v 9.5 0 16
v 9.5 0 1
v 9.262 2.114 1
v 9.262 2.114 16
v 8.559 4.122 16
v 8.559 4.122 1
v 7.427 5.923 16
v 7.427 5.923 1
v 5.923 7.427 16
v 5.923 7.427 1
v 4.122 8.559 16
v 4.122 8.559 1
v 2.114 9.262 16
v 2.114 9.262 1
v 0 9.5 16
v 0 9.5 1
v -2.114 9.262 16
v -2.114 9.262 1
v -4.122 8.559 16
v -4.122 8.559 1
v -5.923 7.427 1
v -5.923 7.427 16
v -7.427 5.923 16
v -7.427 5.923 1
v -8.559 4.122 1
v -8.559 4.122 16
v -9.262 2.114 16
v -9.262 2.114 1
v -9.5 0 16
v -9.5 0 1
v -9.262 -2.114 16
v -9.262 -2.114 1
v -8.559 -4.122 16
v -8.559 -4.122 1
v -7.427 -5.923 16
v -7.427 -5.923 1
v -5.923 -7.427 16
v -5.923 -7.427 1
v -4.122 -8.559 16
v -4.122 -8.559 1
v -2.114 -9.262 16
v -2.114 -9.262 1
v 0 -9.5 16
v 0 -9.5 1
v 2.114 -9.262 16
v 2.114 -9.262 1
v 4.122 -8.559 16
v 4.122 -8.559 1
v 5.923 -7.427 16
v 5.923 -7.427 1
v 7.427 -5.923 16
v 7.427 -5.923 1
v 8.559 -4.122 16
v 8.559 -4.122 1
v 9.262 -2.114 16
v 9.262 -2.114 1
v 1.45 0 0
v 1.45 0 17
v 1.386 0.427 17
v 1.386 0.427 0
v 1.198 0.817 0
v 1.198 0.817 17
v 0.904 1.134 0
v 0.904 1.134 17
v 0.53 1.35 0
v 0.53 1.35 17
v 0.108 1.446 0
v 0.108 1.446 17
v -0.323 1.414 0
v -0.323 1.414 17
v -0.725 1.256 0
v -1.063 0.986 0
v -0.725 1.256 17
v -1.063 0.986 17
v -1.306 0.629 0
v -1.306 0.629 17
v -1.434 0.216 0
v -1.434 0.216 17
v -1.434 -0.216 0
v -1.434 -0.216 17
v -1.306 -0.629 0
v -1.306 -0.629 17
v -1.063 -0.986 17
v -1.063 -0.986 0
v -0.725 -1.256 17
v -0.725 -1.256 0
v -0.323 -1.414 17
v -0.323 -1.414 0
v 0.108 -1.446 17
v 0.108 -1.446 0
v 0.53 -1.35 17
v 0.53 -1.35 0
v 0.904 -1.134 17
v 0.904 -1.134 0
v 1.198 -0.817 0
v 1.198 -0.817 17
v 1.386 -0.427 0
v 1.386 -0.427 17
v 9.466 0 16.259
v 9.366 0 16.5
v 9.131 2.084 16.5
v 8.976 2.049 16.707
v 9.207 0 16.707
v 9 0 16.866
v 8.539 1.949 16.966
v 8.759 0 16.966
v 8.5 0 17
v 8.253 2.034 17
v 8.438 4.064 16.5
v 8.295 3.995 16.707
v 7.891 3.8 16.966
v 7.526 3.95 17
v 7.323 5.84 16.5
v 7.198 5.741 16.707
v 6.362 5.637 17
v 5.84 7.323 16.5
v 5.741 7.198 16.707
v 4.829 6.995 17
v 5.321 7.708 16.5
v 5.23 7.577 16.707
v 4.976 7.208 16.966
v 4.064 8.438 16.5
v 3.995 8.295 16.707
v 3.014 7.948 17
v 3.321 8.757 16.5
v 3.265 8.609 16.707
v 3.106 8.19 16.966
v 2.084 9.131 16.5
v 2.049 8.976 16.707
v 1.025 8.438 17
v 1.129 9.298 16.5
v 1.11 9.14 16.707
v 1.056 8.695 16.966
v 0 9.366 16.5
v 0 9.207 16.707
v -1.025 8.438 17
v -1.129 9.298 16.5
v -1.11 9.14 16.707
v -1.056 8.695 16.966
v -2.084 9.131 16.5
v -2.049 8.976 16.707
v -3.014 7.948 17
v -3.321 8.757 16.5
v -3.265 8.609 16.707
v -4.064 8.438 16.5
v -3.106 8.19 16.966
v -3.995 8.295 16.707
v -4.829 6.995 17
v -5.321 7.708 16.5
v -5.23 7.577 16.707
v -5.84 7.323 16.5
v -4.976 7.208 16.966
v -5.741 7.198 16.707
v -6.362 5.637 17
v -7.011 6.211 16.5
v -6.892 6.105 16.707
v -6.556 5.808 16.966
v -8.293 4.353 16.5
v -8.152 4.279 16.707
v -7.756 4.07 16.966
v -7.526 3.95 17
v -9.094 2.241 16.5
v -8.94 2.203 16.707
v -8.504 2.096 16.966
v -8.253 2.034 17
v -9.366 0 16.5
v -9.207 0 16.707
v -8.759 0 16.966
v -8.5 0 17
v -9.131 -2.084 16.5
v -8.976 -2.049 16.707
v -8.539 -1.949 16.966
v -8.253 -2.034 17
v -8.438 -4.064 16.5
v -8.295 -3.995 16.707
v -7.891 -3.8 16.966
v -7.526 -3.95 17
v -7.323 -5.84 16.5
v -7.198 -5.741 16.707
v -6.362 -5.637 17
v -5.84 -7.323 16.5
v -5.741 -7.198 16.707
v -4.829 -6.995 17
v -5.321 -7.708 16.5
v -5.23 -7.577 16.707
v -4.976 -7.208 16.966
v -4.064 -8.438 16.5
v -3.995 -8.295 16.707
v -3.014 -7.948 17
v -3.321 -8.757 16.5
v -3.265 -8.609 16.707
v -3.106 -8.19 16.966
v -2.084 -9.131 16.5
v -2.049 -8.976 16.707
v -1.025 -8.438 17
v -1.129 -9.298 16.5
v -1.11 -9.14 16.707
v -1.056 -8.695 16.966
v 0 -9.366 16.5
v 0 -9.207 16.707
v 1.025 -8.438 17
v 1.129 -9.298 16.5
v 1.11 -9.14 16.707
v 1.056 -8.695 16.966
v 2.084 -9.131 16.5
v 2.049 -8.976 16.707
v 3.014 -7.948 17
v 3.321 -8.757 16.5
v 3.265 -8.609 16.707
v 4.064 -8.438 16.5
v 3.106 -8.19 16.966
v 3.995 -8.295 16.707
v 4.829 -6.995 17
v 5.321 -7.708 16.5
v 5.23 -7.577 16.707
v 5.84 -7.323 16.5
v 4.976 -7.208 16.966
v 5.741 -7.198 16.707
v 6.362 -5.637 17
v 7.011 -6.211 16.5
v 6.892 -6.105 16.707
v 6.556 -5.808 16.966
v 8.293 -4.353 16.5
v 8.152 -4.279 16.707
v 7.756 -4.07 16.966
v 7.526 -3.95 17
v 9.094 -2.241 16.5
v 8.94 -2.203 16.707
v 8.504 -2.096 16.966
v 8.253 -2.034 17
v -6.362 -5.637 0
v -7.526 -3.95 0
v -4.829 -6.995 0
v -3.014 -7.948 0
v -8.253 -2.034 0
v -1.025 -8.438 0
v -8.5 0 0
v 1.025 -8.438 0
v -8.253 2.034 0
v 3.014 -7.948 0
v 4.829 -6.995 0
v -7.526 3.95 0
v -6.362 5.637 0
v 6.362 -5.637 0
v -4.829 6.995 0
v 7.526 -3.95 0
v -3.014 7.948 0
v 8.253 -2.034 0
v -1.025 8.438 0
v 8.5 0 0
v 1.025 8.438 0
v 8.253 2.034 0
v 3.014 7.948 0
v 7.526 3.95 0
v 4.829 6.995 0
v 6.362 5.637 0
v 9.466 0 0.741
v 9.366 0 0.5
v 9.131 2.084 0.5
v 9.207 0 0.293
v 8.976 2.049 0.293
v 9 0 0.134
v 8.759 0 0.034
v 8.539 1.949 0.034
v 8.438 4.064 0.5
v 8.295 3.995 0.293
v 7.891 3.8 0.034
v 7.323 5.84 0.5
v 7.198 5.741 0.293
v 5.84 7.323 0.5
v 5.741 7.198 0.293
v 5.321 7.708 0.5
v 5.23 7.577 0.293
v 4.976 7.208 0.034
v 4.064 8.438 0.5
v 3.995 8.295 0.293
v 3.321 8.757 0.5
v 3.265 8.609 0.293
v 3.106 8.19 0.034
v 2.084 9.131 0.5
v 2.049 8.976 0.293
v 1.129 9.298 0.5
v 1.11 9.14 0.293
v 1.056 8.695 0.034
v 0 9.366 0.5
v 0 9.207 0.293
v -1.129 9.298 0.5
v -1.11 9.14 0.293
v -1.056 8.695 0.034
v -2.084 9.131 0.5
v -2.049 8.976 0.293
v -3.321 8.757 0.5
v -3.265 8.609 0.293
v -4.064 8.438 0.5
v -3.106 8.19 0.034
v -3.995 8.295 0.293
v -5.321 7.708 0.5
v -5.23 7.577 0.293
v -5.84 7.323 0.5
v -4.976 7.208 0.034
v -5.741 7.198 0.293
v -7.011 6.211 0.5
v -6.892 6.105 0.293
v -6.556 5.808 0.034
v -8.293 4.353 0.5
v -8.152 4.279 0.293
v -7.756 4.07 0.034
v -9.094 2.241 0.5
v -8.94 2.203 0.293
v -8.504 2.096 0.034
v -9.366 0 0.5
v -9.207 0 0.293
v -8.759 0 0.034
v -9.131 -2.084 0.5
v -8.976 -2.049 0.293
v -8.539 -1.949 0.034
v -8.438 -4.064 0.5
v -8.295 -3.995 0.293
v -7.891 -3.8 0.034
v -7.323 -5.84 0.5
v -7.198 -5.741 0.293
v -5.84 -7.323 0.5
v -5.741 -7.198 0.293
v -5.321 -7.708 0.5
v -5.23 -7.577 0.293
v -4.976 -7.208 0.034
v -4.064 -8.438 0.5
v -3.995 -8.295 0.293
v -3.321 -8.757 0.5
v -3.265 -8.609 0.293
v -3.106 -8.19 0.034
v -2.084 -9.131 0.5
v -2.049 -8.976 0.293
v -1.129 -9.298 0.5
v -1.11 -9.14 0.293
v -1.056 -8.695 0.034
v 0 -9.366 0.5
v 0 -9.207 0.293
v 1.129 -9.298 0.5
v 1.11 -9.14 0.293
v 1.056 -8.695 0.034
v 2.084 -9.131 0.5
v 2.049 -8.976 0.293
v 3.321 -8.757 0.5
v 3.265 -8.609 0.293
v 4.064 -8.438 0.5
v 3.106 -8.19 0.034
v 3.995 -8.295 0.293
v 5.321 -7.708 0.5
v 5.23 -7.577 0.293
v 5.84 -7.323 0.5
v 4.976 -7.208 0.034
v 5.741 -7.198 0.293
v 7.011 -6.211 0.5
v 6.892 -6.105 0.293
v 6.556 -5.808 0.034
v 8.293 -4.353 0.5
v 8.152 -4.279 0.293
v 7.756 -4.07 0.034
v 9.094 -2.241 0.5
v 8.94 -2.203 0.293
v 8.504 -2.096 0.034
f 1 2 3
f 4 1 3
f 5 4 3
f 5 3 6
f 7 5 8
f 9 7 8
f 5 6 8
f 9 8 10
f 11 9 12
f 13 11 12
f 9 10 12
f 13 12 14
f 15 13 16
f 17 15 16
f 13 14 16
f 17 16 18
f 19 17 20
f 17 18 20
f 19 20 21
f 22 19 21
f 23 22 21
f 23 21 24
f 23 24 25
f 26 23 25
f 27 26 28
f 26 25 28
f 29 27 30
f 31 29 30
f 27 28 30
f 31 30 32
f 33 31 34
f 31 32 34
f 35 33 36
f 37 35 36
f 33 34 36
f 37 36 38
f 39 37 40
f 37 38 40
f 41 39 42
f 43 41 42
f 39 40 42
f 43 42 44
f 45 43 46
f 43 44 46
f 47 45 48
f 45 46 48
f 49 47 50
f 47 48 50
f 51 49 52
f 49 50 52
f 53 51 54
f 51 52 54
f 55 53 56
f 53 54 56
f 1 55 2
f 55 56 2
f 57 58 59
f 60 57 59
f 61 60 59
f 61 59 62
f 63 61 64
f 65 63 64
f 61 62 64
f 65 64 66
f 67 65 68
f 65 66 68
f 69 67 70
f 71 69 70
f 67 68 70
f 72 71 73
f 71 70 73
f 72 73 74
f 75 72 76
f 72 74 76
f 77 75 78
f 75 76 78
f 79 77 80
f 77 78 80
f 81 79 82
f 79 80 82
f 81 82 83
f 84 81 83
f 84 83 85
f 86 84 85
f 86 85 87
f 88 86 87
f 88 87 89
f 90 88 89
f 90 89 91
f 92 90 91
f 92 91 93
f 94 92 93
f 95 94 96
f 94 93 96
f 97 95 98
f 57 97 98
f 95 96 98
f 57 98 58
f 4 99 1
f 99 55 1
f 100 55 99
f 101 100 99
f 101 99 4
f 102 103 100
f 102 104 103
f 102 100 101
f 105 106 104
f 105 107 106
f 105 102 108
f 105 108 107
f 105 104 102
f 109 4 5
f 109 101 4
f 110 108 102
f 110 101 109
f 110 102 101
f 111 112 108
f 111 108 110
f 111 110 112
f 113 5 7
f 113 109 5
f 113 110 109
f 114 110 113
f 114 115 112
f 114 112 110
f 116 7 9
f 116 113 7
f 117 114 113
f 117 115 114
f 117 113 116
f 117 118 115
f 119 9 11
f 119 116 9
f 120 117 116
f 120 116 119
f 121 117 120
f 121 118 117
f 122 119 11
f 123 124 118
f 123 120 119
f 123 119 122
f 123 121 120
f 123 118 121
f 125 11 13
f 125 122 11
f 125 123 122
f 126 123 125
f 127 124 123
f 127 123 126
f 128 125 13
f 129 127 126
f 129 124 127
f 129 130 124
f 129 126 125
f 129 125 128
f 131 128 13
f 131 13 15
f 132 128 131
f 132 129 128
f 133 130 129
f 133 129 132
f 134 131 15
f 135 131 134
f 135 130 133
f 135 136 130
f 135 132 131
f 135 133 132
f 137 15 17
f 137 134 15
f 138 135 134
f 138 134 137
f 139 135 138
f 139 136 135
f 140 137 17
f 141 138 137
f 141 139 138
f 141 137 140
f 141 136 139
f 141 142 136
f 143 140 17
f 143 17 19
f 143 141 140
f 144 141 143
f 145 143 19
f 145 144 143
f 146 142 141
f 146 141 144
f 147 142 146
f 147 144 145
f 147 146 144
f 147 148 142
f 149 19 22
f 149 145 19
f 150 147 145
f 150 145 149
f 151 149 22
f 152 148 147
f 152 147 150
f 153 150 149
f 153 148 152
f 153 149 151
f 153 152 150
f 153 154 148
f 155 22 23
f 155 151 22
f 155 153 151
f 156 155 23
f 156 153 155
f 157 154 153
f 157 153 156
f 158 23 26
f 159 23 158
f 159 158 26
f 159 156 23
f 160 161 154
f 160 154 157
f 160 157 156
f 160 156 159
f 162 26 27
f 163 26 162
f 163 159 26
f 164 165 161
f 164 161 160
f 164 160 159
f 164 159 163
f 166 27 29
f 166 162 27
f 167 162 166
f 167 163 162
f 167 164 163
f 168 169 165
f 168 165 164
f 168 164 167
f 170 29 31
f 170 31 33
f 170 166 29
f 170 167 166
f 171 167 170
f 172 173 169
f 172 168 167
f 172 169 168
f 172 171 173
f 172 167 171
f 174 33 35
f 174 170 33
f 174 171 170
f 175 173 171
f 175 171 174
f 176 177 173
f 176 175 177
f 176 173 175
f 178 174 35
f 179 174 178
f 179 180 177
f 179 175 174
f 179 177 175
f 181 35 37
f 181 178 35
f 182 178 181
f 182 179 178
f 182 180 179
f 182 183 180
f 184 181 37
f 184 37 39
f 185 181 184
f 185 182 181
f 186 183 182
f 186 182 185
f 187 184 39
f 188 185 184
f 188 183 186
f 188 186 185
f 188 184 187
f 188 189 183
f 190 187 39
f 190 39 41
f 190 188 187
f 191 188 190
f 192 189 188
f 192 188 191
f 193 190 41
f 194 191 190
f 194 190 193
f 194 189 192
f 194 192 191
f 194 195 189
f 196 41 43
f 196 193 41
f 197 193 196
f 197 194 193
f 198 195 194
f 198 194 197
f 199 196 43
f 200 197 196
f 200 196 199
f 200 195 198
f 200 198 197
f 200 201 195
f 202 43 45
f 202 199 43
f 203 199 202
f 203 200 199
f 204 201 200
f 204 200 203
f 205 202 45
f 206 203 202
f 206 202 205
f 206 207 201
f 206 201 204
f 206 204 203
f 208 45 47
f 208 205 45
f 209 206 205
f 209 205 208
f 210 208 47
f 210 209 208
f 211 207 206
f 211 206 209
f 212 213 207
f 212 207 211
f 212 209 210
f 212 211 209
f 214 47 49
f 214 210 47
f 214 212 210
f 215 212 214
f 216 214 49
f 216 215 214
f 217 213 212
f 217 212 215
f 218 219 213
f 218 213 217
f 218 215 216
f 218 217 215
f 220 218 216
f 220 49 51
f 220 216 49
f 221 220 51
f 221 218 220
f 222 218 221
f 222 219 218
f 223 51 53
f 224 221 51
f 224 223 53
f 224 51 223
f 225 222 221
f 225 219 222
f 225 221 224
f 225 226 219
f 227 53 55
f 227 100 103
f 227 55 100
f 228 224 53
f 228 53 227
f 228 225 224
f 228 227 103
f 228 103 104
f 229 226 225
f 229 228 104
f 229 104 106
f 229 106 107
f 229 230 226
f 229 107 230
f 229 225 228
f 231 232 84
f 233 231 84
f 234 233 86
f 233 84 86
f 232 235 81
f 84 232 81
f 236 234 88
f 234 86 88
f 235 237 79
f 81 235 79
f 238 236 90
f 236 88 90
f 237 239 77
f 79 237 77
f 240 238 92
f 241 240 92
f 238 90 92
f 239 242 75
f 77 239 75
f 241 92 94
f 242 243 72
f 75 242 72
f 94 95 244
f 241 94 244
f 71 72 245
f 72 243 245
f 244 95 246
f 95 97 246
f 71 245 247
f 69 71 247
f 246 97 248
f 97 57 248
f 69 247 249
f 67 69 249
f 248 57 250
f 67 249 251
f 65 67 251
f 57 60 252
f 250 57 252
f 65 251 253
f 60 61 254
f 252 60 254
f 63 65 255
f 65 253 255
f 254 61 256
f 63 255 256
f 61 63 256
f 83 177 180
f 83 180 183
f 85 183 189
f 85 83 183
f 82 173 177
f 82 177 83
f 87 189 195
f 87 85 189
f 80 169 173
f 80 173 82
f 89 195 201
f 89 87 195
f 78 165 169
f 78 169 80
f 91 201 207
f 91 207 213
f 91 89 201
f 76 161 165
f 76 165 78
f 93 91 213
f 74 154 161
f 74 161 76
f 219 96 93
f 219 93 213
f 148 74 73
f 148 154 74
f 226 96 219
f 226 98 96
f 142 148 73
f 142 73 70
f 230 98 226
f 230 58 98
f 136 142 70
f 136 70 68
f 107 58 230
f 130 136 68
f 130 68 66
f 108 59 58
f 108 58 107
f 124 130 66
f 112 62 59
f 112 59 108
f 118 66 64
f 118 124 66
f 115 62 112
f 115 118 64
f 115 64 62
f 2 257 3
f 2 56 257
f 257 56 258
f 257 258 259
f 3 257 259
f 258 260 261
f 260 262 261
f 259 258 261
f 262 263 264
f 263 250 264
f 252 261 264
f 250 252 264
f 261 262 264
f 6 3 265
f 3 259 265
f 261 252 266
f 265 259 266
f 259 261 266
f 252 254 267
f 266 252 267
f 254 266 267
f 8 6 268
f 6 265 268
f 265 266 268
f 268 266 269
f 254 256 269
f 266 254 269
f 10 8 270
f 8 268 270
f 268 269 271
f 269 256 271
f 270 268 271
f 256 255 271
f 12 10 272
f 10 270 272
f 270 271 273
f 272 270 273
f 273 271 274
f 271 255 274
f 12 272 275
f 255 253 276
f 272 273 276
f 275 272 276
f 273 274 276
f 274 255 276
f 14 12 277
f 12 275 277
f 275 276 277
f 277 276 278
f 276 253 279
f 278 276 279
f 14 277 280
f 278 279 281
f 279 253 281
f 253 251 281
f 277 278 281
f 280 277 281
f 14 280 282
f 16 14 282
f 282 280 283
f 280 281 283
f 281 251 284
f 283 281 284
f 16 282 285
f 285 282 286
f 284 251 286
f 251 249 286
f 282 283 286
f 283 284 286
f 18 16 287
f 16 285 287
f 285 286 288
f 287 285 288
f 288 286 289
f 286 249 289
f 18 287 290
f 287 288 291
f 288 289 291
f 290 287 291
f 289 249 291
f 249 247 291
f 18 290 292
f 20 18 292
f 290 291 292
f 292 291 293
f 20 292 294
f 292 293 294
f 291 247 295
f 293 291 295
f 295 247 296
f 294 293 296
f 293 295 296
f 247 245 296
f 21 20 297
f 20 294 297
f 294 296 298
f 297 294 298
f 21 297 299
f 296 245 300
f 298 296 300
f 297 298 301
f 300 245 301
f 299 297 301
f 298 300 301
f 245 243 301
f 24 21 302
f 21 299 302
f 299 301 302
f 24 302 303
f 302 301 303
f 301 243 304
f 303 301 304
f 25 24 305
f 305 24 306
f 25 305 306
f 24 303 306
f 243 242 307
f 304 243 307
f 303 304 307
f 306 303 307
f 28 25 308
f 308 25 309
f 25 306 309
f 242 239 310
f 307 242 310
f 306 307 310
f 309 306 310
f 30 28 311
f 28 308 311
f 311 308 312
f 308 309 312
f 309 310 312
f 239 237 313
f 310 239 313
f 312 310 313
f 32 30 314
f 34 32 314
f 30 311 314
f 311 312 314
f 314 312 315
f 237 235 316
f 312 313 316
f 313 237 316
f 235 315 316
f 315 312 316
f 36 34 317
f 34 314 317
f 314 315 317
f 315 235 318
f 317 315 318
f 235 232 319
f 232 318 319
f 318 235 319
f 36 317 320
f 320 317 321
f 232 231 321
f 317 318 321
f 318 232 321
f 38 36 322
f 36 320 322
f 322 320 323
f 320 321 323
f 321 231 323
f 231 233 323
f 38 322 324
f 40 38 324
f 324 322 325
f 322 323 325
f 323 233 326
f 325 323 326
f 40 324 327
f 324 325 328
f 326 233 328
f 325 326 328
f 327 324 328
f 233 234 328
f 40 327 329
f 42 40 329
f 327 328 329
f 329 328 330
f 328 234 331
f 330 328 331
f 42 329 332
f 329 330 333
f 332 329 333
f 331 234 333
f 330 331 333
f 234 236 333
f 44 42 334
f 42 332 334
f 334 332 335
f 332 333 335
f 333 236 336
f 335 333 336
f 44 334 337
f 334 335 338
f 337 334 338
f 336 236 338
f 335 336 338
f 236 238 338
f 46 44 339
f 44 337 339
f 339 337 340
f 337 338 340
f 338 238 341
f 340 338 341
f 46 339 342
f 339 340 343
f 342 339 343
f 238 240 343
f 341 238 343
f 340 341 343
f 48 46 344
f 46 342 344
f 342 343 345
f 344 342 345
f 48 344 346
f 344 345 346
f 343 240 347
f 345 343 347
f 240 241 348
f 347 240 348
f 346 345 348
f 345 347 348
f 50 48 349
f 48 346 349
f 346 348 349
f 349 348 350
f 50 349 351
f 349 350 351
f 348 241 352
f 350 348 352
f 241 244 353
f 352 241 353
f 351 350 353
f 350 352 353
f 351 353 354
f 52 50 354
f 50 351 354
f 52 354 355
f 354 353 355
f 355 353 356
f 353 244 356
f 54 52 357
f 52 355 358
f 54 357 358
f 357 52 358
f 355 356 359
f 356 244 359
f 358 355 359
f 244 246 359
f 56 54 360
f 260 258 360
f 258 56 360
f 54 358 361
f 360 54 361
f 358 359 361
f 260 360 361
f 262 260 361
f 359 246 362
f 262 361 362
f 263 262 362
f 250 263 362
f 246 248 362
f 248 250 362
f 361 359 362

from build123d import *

# Parameters (mm, degrees)
SKETCH1_R           = 9.5
BOSS_EXTRUDE1_DEPTH = 17
FILLET1_R           = 1
SKETCH2_R           = 1.45
CUT_EXTRUDE1_DEPTH  = 17


with BuildPart() as part:
    # Sketch1 → Boss-Extrude1 (new body)
    with BuildSketch(Plane.XY):
        Circle(SKETCH1_R)
    extrude(amount=BOSS_EXTRUDE1_DEPTH)

    # Fillet1
    fillet1_edges = [part.edges().sort_by_distance(p)[0] for p in [
        (-9.5, 0, 0),
        (-9.5, 0, 17),
    ]]
    fillet(fillet1_edges, radius=FILLET1_R)

    # Sketch2 → Cut-Extrude1 (cut)
    with BuildSketch(Plane.XY.offset(17)):
        Circle(SKETCH2_R)
    extrude(amount=-CUT_EXTRUDE1_DEPTH, mode=Mode.SUBTRACT)


solid = part.part
